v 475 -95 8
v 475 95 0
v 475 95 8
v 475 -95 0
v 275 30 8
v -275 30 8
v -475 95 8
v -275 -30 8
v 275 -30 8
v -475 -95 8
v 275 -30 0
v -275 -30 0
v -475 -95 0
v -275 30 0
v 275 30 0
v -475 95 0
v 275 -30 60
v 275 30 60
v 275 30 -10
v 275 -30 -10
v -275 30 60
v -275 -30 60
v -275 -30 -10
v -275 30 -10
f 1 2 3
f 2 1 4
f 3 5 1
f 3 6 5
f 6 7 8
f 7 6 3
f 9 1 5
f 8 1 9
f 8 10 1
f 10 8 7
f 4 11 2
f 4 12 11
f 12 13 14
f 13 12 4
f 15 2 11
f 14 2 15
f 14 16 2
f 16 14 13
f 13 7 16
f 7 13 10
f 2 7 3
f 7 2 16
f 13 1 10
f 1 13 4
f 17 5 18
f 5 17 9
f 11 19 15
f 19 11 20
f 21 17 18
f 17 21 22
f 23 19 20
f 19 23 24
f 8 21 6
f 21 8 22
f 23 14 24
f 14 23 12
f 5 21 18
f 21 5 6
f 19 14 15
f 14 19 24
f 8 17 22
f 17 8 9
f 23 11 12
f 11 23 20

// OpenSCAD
// Conceptual parametric airframe (OpenSCAD). Units: mm
wing_span = 950;
wing_chord = 190;
fuse_len = 550;
fuse_w = 60;
fuse_h = 70;

translate([-wing_span/2, -wing_chord/2, 0]) cube([wing_span, wing_chord, 8]);
translate([-fuse_len/2, -fuse_w/2, 25-fuse_h/2]) cube([fuse_len, fuse_w, fuse_h]);
